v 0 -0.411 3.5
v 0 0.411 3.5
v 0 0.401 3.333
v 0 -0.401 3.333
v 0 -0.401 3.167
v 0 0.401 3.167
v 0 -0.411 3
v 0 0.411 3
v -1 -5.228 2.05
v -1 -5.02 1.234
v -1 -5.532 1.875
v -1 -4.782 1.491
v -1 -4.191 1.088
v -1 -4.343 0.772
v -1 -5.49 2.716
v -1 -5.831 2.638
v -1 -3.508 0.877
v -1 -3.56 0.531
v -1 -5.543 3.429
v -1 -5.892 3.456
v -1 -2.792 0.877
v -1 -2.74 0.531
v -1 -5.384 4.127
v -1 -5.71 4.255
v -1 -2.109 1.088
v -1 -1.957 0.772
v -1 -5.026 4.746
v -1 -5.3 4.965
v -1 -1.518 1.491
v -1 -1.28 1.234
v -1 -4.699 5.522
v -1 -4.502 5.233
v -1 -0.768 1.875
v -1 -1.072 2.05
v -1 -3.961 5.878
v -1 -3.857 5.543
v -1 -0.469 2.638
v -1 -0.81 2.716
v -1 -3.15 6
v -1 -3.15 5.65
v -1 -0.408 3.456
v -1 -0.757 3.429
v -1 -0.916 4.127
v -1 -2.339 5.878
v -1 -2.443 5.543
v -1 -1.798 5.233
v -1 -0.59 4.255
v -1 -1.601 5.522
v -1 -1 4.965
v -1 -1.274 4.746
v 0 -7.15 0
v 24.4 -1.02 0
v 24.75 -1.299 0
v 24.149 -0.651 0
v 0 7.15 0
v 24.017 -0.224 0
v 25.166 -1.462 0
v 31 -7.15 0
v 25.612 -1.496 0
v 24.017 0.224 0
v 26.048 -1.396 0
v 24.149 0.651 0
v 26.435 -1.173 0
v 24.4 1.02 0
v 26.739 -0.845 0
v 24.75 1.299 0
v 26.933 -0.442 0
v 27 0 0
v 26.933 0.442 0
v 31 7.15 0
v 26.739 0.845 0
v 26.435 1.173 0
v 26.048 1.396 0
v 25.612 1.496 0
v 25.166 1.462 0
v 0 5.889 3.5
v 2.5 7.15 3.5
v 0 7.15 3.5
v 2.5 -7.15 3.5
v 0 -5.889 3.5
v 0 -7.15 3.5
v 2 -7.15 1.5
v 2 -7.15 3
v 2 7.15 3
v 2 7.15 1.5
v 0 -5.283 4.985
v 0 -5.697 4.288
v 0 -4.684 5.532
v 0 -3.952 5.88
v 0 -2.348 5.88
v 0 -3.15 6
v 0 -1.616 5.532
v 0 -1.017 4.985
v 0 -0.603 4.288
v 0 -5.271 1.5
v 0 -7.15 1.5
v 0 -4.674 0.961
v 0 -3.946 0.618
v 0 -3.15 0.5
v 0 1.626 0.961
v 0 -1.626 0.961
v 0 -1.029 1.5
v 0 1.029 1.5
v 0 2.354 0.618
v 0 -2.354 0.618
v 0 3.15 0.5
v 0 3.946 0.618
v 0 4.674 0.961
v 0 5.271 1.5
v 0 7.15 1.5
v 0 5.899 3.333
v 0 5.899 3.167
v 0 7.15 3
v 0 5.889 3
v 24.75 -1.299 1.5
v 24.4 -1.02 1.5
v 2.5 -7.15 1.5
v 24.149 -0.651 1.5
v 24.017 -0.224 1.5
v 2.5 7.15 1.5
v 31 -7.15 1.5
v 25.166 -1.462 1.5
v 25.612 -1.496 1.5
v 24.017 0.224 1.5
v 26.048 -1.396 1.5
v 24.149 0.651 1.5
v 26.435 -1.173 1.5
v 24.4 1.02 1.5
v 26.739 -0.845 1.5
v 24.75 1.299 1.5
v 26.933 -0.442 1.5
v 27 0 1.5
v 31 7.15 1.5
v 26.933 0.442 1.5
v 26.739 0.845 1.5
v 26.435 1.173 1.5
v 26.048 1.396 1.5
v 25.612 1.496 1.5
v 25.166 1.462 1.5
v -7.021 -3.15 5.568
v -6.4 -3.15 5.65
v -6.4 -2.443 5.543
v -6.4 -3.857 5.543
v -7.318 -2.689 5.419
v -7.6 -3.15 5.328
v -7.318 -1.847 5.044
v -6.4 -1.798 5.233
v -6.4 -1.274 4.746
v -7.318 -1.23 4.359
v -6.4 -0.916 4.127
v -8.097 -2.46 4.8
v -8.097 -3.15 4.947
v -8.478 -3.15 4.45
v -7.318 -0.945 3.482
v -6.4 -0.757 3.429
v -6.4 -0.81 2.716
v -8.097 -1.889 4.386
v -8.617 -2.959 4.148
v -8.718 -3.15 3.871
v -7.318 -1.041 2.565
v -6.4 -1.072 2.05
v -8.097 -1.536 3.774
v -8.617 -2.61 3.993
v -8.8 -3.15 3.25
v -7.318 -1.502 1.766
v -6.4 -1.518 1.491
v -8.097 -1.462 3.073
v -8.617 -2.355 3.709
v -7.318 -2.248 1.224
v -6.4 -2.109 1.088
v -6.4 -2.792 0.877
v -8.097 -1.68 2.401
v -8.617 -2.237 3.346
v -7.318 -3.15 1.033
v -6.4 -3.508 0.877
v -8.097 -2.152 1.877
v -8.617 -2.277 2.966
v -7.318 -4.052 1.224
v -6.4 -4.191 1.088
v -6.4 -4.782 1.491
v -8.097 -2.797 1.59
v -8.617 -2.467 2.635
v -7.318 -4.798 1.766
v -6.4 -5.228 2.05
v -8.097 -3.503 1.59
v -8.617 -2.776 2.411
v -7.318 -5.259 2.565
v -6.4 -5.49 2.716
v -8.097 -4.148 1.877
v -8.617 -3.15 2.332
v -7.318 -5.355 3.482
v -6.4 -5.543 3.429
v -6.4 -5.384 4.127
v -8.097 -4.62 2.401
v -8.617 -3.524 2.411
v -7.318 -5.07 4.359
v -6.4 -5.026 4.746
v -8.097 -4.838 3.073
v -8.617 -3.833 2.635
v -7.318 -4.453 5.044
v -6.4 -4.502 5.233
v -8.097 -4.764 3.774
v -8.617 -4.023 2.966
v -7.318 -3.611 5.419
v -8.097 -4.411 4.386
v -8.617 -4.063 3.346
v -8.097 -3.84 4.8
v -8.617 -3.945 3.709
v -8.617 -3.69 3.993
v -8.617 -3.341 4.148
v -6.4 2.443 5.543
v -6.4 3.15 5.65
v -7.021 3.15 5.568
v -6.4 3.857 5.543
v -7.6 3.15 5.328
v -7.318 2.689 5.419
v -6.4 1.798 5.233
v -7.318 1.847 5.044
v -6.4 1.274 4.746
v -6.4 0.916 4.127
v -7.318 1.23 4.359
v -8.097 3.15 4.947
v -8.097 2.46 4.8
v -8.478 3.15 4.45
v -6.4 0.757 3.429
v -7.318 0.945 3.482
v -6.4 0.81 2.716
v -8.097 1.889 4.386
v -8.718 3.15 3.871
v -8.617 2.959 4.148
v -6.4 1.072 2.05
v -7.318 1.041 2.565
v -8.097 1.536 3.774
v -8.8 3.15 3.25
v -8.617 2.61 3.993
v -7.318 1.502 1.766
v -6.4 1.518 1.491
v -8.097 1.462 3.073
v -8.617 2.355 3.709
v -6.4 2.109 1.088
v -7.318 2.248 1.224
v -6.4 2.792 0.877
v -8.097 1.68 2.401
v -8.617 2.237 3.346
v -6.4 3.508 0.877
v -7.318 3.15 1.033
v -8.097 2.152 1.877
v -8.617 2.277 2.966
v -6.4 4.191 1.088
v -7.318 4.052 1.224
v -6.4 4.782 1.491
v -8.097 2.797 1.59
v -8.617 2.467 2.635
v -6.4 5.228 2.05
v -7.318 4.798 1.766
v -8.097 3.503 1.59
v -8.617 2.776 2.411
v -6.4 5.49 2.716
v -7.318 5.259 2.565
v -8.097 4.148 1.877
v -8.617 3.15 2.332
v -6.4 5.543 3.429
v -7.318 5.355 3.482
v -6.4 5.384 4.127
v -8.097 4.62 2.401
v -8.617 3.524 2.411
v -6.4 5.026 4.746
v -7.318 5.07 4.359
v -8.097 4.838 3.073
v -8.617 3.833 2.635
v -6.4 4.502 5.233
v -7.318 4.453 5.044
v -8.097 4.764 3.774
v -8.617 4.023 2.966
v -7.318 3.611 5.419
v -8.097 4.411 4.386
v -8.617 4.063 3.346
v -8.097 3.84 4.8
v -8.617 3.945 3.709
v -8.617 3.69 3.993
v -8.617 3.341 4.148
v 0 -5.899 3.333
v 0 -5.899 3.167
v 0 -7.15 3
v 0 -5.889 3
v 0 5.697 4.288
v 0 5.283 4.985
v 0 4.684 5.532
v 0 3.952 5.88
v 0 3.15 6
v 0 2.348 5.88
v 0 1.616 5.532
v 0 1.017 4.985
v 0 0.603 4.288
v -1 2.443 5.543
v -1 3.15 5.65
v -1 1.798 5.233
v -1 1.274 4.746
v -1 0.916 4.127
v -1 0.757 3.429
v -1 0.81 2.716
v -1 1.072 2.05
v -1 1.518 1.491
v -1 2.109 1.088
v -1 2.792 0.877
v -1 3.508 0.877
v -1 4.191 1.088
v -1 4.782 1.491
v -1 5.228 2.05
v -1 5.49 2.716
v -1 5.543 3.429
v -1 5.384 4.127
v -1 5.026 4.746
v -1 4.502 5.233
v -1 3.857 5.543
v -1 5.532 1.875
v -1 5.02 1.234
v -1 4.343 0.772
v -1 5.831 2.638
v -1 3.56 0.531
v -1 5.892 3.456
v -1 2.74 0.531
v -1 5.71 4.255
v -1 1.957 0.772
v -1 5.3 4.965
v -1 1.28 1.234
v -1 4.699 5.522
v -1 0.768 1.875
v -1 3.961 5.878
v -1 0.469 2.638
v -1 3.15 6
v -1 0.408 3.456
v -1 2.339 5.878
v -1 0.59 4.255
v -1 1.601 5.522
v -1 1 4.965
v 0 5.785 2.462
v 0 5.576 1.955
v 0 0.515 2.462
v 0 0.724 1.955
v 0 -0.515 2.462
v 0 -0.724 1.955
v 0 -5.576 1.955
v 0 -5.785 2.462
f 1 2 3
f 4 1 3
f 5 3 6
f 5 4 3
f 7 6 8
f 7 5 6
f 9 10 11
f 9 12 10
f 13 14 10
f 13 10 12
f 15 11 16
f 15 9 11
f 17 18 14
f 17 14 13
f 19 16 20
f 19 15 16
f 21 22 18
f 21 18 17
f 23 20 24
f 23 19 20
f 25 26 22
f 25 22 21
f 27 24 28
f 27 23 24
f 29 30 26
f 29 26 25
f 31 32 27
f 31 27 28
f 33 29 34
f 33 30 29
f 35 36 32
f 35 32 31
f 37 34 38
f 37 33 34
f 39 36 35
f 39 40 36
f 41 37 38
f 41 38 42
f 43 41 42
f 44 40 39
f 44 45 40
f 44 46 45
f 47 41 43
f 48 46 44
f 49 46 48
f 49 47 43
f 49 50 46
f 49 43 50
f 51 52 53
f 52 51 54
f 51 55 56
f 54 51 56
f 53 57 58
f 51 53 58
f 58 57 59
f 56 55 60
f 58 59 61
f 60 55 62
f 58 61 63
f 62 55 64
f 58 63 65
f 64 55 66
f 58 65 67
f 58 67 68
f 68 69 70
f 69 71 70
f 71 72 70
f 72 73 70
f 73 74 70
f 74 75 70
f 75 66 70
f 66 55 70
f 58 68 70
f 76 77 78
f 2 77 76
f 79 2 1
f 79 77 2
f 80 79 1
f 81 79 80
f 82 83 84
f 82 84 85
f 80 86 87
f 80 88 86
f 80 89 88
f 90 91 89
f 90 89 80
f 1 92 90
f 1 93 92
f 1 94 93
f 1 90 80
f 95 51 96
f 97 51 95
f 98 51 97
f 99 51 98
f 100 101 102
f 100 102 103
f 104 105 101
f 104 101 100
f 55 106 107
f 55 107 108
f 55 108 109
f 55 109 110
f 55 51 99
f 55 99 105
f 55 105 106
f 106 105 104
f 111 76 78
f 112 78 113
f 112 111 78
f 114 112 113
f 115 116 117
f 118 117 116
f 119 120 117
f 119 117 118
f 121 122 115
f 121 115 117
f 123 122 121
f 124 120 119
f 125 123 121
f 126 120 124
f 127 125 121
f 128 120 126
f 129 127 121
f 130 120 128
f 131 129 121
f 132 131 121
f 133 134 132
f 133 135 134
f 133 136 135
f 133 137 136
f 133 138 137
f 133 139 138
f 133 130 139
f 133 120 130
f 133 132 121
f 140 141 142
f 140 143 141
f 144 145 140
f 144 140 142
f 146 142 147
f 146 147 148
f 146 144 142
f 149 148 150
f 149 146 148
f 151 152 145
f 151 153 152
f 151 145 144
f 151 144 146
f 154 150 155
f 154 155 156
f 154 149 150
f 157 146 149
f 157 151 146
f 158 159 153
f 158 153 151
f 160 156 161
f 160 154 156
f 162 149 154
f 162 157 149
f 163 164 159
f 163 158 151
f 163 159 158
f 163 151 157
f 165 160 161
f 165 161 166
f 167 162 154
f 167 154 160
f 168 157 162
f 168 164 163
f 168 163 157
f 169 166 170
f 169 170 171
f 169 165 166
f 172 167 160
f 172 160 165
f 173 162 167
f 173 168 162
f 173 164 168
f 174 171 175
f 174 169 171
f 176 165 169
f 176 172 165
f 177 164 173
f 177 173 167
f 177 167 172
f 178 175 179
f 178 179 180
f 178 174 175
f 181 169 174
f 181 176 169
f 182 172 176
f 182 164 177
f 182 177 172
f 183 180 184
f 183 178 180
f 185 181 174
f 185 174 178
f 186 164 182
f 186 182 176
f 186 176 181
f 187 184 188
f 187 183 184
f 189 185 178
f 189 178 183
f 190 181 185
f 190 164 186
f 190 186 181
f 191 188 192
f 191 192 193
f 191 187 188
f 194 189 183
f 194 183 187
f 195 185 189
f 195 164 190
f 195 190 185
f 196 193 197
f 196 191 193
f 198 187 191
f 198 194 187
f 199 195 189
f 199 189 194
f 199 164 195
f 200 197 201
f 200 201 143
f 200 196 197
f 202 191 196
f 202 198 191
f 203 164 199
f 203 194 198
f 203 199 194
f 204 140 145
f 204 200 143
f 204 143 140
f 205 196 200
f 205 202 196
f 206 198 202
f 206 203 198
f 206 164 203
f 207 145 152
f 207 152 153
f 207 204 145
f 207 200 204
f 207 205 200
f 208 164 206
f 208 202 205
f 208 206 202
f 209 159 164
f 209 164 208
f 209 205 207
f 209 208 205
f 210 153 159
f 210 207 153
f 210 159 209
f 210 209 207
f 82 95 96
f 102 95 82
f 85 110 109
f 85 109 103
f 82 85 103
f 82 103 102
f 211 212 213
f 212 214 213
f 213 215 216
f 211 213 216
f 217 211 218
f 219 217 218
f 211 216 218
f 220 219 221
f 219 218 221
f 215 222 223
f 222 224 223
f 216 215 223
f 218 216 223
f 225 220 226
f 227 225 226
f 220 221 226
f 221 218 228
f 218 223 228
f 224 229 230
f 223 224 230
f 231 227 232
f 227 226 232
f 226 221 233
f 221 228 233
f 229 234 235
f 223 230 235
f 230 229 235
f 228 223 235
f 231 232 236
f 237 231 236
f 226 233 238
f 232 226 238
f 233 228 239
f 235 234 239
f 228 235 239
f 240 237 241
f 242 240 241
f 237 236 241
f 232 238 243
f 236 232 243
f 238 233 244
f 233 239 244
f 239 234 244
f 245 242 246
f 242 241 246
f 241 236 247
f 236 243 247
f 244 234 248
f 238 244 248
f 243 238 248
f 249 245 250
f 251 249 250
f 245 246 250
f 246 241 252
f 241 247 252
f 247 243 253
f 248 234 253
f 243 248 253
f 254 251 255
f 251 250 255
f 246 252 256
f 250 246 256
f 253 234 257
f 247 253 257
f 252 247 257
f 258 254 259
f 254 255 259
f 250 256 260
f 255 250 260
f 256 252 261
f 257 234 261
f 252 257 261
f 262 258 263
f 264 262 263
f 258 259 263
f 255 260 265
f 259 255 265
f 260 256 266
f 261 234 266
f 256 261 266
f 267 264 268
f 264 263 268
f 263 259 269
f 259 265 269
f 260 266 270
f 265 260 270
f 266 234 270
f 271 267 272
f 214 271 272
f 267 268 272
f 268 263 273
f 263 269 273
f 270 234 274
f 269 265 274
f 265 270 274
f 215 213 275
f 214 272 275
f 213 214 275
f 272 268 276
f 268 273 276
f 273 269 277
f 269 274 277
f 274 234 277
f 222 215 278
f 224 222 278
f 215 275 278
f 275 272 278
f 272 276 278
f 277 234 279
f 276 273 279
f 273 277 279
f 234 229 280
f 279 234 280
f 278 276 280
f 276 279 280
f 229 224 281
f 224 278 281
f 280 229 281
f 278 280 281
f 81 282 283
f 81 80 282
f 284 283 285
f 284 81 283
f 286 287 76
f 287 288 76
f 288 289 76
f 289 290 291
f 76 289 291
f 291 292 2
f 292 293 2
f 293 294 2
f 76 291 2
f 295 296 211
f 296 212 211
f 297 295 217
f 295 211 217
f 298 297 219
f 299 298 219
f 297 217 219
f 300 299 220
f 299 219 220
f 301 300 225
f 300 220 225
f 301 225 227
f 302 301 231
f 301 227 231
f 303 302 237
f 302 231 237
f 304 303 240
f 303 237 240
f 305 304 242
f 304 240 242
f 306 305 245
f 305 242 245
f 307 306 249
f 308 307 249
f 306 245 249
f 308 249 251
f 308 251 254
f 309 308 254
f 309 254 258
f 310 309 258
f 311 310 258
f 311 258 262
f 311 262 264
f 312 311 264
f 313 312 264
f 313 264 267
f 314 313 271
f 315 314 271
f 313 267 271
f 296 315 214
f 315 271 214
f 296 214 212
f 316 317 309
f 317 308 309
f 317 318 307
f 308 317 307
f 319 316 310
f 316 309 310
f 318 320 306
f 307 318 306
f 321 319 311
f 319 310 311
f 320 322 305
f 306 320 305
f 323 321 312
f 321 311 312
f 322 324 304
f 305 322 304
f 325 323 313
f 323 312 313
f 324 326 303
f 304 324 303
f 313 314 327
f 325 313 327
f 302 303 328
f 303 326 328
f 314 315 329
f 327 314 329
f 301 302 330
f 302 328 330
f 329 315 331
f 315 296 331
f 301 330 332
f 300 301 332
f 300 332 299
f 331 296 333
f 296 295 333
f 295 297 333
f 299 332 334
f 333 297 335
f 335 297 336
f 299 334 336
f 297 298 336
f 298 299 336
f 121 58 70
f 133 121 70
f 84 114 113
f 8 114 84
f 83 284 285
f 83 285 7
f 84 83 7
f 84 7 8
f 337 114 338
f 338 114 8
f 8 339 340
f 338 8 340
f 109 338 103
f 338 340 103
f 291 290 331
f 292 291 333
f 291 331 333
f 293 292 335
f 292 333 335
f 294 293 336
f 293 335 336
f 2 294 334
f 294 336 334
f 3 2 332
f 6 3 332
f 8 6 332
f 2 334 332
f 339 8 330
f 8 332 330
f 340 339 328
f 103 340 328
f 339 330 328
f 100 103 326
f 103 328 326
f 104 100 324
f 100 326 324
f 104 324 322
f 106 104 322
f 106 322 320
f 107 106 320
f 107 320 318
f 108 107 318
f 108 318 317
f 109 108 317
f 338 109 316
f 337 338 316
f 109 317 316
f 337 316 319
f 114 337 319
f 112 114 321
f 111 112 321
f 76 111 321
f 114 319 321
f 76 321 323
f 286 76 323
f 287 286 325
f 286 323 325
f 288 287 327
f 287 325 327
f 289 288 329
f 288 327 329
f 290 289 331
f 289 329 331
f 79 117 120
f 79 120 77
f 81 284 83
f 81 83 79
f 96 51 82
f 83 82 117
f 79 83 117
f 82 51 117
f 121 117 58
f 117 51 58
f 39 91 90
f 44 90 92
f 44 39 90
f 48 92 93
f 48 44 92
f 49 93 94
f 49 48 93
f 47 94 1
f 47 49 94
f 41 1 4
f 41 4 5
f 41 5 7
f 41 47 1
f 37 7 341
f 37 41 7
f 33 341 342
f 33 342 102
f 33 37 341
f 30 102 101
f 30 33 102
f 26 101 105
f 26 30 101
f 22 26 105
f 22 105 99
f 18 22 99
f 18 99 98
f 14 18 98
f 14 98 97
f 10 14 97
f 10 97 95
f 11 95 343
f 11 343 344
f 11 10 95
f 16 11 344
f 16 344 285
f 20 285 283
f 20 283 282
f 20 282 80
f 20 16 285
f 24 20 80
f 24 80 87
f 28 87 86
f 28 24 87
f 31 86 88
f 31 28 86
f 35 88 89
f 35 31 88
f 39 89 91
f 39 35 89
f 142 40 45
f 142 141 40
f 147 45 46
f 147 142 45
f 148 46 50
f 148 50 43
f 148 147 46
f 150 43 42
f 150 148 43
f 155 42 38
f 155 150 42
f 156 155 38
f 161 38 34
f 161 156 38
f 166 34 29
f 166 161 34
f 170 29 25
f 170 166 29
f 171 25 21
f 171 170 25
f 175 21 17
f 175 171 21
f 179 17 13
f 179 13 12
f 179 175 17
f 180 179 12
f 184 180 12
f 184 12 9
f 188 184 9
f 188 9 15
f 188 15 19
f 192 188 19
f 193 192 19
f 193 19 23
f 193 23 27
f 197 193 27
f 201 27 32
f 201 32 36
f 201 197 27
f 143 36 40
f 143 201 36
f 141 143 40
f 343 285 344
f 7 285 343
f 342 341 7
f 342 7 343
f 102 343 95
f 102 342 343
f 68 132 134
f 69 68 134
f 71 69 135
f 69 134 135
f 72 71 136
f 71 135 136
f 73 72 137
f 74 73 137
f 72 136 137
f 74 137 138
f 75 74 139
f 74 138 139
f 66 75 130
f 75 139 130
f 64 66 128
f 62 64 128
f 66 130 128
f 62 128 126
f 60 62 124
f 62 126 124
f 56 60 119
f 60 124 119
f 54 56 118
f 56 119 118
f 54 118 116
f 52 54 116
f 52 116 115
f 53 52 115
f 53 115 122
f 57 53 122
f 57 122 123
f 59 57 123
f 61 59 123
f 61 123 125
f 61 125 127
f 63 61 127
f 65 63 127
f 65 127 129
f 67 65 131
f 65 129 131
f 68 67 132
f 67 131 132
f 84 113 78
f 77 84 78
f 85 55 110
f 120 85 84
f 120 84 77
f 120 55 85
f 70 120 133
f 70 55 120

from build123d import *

# Parameters (mm, degrees)
SKETCH1_W           = 31
SKETCH1_H           = 14.3
BOSS_EXTRUDE1_DEPTH = 1.5
BOSS_EXTRUDE2_DEPTH = 14.3
SKETCH5_R           = 1.5
CUT_EXTRUDE1_DEPTH  = 1.5


with BuildPart() as part:
    # Sketch1 → Boss-Extrude1 (new body)
    with BuildSketch(Plane.XY):
        with Locations((15.5, 0)):
            Rectangle(SKETCH1_W, SKETCH1_H)
    extrude(amount=BOSS_EXTRUDE1_DEPTH)

    # Sketch2 → Boss-Extrude2 (add, through all)
    with BuildSketch(Plane.XZ.offset(7.15)):
        Polygon((2.5, 1.5), (2.5, 3.5), (0, 3.5), (0, 3), (2, 3), (2, 1.5), align=None)
    extrude(amount=-BOSS_EXTRUDE2_DEPTH)

    # Sketch4 → Revolve1 (revolve)
    with BuildSketch(Plane.XZ.offset(3.15)):
        with BuildLine():
            Line((0, 3.5), (0, 6))
            Line((0, 6), (-1, 6))
            Line((-1, 6), (-1, 5.65))
            Line((-1, 5.65), (-6.4, 5.65))
            ThreePointArc((-6.4, 5.65), (-8.097056275, 4.947056275), (-8.8, 3.25))
            Line((-8.8, 3.25), (0, 3.25))
            Line((0, 3.25), (0, 3.5))
        make_face()
    revolve1 = revolve(axis=Axis((0, -3.15, 3.25), (-1, 0, 0)))

    # Mirror1: Revolve1 across plane
    add(revolve1.mirror(Plane.ZX))

    # Sketch5 → Cut-Extrude1 (cut)
    with BuildSketch(Plane.XY.offset(1.5)):
        with Locations((25.5, 0)):
            Circle(SKETCH5_R)
    extrude(amount=-CUT_EXTRUDE1_DEPTH, mode=Mode.SUBTRACT)


solid = part.part
